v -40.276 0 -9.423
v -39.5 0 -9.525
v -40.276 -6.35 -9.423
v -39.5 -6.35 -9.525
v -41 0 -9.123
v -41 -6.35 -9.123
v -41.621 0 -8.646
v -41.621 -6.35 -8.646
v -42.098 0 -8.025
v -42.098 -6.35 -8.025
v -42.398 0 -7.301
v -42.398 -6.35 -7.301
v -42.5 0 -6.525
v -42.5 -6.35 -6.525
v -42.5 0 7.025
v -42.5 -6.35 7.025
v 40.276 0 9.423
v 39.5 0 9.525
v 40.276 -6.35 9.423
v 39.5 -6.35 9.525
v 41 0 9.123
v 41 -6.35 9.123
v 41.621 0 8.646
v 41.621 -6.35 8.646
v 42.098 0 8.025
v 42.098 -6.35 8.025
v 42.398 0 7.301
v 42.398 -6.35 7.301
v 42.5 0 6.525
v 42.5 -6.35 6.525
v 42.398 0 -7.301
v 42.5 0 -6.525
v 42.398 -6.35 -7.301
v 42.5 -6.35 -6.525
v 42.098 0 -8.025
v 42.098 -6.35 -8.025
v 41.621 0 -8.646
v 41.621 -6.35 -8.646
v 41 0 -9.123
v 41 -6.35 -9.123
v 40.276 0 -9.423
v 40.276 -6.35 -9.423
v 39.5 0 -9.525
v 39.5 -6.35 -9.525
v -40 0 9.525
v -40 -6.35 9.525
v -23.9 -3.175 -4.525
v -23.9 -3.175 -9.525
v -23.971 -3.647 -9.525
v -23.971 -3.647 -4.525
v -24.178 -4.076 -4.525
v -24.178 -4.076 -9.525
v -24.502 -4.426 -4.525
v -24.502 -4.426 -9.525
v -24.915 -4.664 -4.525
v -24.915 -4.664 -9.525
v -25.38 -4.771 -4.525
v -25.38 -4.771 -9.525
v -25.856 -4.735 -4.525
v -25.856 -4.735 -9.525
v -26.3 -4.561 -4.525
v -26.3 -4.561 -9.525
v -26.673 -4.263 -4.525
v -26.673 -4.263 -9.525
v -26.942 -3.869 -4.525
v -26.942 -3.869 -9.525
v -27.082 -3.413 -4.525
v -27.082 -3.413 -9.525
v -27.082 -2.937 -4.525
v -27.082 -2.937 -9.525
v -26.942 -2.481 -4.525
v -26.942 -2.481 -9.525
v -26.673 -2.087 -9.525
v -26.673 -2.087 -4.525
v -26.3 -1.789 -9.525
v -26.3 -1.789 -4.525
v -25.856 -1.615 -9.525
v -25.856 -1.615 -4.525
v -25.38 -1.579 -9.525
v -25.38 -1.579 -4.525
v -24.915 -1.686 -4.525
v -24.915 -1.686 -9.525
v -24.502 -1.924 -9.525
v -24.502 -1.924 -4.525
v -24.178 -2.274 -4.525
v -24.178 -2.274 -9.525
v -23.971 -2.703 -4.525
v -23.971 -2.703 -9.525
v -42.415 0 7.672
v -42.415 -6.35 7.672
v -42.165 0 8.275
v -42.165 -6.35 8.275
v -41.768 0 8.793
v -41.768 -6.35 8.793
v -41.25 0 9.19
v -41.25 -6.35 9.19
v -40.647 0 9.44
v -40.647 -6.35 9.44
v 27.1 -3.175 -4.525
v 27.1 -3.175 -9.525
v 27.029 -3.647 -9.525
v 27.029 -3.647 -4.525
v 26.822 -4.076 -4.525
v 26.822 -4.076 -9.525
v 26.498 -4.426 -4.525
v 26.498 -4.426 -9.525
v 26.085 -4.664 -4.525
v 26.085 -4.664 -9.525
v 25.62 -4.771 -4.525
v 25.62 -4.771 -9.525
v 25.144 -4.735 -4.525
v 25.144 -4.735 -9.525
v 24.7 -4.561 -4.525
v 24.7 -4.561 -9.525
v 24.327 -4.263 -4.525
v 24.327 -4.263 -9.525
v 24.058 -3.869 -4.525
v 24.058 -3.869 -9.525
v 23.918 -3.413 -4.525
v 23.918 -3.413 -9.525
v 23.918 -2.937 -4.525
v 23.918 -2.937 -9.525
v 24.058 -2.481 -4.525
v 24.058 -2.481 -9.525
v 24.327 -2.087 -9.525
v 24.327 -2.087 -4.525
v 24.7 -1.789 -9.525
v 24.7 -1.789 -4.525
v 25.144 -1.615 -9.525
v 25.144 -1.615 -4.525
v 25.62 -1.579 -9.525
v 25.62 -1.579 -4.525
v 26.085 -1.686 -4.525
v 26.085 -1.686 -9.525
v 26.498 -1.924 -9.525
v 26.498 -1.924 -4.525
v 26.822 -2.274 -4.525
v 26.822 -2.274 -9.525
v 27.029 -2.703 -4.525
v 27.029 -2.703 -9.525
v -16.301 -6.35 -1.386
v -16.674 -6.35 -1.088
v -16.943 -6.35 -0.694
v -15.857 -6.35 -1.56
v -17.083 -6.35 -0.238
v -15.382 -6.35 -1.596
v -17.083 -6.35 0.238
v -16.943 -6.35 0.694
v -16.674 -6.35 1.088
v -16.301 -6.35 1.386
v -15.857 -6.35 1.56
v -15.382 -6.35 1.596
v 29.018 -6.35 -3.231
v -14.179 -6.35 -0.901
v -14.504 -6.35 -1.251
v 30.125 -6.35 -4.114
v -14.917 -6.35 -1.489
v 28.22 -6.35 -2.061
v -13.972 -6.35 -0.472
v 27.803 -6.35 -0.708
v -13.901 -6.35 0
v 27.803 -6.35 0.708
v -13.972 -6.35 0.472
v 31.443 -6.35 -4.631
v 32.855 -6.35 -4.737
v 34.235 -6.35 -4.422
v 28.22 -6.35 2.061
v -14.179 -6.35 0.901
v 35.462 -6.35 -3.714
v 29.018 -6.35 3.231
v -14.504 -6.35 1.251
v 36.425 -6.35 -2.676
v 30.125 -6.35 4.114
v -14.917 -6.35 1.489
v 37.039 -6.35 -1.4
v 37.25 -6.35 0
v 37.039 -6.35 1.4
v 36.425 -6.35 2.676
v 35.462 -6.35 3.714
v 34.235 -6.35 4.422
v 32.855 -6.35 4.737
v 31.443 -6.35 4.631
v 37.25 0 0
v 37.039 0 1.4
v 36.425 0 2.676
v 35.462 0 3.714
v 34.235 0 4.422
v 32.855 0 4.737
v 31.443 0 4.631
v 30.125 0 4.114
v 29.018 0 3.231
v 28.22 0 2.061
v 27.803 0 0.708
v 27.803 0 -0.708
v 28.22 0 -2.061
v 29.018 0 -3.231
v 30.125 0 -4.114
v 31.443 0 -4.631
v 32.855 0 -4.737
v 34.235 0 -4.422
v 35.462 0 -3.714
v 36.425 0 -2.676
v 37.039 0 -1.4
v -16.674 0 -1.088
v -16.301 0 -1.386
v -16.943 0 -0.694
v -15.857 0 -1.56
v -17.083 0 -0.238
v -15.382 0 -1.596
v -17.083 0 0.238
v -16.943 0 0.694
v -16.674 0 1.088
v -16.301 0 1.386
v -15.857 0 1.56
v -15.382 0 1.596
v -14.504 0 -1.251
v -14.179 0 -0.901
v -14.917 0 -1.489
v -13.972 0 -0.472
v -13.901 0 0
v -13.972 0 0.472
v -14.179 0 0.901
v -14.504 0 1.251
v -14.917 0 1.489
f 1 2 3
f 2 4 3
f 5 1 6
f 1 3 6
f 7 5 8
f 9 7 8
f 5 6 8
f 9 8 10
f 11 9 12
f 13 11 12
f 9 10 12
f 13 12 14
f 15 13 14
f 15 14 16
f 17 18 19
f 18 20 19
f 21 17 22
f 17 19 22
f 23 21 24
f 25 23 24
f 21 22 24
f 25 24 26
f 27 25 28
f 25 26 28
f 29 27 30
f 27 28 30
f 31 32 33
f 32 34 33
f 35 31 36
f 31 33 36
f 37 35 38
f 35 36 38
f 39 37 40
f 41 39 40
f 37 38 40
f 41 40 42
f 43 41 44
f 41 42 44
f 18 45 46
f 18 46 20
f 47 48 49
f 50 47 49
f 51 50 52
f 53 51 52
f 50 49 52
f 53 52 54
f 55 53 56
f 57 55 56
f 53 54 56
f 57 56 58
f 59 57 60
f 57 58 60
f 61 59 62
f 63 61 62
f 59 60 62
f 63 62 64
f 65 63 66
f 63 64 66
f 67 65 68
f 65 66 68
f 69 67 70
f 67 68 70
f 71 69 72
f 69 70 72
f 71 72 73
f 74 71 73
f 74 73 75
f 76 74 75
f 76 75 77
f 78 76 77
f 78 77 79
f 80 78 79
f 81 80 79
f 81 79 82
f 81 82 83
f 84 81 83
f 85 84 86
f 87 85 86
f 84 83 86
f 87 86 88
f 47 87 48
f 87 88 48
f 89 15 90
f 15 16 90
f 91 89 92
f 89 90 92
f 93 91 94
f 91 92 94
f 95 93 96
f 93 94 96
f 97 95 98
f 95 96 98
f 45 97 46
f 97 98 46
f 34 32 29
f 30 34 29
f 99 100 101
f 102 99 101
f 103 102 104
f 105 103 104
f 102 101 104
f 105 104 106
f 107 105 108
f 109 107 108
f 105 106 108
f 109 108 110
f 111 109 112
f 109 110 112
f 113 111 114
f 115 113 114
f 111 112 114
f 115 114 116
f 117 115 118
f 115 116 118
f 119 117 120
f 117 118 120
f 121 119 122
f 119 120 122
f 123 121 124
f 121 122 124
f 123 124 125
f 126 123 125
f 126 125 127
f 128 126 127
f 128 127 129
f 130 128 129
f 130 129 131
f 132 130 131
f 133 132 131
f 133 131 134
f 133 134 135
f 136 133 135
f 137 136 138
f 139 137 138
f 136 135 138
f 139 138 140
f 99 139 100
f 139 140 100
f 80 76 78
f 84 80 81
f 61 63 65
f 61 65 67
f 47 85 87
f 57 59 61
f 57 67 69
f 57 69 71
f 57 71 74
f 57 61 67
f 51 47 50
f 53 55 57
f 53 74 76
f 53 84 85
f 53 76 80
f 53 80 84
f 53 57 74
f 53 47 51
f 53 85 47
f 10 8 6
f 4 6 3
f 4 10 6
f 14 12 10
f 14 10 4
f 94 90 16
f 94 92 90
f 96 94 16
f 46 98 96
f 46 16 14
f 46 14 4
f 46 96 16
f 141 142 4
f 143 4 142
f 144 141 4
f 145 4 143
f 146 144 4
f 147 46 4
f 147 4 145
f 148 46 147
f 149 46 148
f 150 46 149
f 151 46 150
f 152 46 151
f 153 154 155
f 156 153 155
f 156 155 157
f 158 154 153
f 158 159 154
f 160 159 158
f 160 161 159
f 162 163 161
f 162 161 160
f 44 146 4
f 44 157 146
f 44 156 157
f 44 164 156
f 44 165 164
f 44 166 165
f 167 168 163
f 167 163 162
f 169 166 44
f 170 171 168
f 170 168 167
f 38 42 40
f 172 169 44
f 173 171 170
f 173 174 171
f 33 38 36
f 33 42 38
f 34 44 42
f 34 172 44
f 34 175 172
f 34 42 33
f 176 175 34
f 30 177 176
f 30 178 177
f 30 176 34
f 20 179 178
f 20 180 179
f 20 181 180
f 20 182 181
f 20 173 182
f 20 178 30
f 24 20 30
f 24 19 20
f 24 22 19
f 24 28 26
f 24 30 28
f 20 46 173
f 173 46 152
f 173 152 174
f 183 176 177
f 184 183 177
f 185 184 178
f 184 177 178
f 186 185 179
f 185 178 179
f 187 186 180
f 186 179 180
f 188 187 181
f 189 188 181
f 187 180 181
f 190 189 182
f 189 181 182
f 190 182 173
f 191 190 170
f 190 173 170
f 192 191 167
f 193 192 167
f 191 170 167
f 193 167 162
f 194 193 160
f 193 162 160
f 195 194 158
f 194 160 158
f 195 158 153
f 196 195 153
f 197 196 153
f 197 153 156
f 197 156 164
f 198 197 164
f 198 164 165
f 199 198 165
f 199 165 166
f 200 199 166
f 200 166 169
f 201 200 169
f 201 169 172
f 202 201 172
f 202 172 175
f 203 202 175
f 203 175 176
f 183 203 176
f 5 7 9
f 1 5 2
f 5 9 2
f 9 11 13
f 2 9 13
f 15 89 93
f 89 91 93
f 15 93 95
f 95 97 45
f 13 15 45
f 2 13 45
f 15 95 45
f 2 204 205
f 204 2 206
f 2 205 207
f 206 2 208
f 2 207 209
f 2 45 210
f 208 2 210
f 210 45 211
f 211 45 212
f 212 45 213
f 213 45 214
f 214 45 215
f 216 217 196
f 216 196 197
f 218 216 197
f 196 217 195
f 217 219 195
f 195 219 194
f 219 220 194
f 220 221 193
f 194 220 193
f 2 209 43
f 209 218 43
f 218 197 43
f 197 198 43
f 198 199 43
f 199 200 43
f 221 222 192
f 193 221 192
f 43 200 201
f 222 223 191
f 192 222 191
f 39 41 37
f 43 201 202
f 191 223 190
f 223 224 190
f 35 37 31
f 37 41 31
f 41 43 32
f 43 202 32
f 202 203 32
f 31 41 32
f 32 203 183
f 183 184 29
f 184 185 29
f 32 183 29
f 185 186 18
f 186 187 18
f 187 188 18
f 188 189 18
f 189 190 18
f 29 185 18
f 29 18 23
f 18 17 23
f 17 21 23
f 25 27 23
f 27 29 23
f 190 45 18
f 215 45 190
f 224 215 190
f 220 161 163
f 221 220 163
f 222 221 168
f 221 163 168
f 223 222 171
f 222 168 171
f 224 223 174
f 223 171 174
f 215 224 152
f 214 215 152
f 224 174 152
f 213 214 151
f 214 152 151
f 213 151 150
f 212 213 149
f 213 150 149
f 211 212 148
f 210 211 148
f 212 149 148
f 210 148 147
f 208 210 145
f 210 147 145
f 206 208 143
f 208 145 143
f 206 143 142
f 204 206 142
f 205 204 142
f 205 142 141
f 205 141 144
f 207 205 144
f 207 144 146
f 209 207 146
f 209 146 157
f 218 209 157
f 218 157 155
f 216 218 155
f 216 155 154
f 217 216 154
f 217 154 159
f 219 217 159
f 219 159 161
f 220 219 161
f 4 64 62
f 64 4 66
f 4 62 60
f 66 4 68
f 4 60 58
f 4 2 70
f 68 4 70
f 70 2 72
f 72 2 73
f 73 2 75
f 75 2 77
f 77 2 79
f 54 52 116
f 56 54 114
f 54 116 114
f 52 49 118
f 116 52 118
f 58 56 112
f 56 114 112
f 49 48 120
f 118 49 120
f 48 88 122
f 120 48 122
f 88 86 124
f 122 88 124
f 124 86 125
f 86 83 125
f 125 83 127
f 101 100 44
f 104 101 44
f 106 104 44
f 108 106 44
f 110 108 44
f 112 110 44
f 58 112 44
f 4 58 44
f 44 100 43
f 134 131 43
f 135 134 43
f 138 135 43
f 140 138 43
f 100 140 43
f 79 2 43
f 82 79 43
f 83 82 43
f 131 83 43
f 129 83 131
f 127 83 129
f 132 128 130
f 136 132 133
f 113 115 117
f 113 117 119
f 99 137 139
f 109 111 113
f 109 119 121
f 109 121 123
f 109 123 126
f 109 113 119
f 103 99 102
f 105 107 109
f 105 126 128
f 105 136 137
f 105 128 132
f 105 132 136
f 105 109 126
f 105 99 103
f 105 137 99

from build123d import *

# Parameters (mm, degrees)
F0_W      = 85
F0_H      = 19.05
F1_DEPTH  = 6.35
F2_R      = 1.6
F3_DEPTH  = 5
F4_R      = 2.5
F5_R      = 3
F6_R      = 3
F7_R      = 3
F8_R      = 4.75
F9_DEPTH  = 25
F10_R     = 1.6
F11_DEPTH = 25


with BuildPart() as f1:
    # F0 (on Front) → F1 (new body)
    with BuildSketch(Plane.XZ):
        Rectangle(F0_W, F0_H)
    extrude(amount=F1_DEPTH)

    # F2 (on face) → F3 (cut)
    with BuildSketch(Plane(origin=(0, 0, -9.525), x_dir=(1, 0, 0), z_dir=(0, 0, -1))):
        with Locations((25.5, 3.175)):
            Circle(F2_R)
        with Locations((-25.5, 3.175)):
            Circle(F2_R)
    extrude(amount=-F3_DEPTH, mode=Mode.SUBTRACT)

    # F4
    f4_edges = [f1.edges().sort_by_distance(p)[0] for p in [
        (-42.5, -3.175, 9.525),
    ]]
    fillet(f4_edges, radius=F4_R)

    # F5
    f5_edges = [f1.edges().sort_by_distance(p)[0] for p in [
        (42.5, -3.175, 9.525),
    ]]
    fillet(f5_edges, radius=F5_R)

    # F6
    f6_edges = [f1.edges().sort_by_distance(p)[0] for p in [
        (42.5, -3.175, -9.525),
    ]]
    fillet(f6_edges, radius=F6_R)

    # F7
    f7_edges = [f1.edges().sort_by_distance(p)[0] for p in [
        (-42.5, -3.175, -9.525),
    ]]
    fillet(f7_edges, radius=F7_R)

    # F8 (on face) → F9 (cut)
    with BuildSketch(Plane.XZ.offset(6.35)):
        with Locations((32.5, 0)):
            Circle(F8_R)
    extrude(amount=-F9_DEPTH, mode=Mode.SUBTRACT)

    # F10 (on face) → F11 (cut)
    with BuildSketch(Plane.XZ.offset(6.35)):
        with Locations((-15.501157, 0)):
            Circle(F10_R)
    extrude(amount=-F11_DEPTH, mode=Mode.SUBTRACT)


solid = f1.part
